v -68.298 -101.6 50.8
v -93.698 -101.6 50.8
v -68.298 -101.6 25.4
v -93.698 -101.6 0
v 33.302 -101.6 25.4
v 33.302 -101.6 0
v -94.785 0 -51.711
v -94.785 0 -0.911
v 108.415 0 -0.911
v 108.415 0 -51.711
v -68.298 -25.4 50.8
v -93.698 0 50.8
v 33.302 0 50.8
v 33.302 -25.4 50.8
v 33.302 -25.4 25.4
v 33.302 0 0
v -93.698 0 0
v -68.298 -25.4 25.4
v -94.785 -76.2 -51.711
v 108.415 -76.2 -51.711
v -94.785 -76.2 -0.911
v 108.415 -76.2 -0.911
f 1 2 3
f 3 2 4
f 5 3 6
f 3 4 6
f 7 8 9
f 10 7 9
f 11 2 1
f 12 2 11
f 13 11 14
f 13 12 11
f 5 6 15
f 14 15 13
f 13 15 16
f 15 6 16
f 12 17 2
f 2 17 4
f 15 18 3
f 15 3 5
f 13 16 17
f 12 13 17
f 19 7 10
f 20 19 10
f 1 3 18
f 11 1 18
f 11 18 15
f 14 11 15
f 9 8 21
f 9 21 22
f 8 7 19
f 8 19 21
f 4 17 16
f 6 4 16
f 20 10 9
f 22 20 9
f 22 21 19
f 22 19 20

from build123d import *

# Parameters (mm, degrees)
F0_W     = 203.2
F0_H     = 50.8
F1_DEPTH = 76.2
F2_W     = 127
F2_H     = 101.6
F3_DEPTH = 25.4
F4_W     = 25.4
F4_H     = 25.4
F4_W_2   = 101.6
F4_H_2   = 76.2
F5_DEPTH = 25.4


with BuildPart() as f1:
    # F0 (on Front) → F1 (new body)
    with BuildSketch(Plane.XZ):
        with Locations((6.814852, -26.311482)):
            Rectangle(F0_W, F0_H)
    extrude(amount=F1_DEPTH)


with BuildPart() as f3:
    # F2 (on Top) → F3 (new body)
    with BuildSketch(Plane.XY):
        with Locations((-30.197584, -50.8)):
            Rectangle(F2_W, F2_H)
    extrude(amount=F3_DEPTH)

    # F4 (on face) → F5 (join)
    with BuildSketch(Plane.XY.offset(25.4)):
        with Locations((-80.997584, -12.7)):
            Rectangle(F4_W, F4_H)
        with Locations((-17.497584, -12.7)):
            Rectangle(F4_W_2, F4_H)
        with Locations((-80.997584, -63.5)):
            Rectangle(F4_W, F4_H_2)
    extrude(amount=F5_DEPTH)


solid = Compound([f1.part, f3.part])
